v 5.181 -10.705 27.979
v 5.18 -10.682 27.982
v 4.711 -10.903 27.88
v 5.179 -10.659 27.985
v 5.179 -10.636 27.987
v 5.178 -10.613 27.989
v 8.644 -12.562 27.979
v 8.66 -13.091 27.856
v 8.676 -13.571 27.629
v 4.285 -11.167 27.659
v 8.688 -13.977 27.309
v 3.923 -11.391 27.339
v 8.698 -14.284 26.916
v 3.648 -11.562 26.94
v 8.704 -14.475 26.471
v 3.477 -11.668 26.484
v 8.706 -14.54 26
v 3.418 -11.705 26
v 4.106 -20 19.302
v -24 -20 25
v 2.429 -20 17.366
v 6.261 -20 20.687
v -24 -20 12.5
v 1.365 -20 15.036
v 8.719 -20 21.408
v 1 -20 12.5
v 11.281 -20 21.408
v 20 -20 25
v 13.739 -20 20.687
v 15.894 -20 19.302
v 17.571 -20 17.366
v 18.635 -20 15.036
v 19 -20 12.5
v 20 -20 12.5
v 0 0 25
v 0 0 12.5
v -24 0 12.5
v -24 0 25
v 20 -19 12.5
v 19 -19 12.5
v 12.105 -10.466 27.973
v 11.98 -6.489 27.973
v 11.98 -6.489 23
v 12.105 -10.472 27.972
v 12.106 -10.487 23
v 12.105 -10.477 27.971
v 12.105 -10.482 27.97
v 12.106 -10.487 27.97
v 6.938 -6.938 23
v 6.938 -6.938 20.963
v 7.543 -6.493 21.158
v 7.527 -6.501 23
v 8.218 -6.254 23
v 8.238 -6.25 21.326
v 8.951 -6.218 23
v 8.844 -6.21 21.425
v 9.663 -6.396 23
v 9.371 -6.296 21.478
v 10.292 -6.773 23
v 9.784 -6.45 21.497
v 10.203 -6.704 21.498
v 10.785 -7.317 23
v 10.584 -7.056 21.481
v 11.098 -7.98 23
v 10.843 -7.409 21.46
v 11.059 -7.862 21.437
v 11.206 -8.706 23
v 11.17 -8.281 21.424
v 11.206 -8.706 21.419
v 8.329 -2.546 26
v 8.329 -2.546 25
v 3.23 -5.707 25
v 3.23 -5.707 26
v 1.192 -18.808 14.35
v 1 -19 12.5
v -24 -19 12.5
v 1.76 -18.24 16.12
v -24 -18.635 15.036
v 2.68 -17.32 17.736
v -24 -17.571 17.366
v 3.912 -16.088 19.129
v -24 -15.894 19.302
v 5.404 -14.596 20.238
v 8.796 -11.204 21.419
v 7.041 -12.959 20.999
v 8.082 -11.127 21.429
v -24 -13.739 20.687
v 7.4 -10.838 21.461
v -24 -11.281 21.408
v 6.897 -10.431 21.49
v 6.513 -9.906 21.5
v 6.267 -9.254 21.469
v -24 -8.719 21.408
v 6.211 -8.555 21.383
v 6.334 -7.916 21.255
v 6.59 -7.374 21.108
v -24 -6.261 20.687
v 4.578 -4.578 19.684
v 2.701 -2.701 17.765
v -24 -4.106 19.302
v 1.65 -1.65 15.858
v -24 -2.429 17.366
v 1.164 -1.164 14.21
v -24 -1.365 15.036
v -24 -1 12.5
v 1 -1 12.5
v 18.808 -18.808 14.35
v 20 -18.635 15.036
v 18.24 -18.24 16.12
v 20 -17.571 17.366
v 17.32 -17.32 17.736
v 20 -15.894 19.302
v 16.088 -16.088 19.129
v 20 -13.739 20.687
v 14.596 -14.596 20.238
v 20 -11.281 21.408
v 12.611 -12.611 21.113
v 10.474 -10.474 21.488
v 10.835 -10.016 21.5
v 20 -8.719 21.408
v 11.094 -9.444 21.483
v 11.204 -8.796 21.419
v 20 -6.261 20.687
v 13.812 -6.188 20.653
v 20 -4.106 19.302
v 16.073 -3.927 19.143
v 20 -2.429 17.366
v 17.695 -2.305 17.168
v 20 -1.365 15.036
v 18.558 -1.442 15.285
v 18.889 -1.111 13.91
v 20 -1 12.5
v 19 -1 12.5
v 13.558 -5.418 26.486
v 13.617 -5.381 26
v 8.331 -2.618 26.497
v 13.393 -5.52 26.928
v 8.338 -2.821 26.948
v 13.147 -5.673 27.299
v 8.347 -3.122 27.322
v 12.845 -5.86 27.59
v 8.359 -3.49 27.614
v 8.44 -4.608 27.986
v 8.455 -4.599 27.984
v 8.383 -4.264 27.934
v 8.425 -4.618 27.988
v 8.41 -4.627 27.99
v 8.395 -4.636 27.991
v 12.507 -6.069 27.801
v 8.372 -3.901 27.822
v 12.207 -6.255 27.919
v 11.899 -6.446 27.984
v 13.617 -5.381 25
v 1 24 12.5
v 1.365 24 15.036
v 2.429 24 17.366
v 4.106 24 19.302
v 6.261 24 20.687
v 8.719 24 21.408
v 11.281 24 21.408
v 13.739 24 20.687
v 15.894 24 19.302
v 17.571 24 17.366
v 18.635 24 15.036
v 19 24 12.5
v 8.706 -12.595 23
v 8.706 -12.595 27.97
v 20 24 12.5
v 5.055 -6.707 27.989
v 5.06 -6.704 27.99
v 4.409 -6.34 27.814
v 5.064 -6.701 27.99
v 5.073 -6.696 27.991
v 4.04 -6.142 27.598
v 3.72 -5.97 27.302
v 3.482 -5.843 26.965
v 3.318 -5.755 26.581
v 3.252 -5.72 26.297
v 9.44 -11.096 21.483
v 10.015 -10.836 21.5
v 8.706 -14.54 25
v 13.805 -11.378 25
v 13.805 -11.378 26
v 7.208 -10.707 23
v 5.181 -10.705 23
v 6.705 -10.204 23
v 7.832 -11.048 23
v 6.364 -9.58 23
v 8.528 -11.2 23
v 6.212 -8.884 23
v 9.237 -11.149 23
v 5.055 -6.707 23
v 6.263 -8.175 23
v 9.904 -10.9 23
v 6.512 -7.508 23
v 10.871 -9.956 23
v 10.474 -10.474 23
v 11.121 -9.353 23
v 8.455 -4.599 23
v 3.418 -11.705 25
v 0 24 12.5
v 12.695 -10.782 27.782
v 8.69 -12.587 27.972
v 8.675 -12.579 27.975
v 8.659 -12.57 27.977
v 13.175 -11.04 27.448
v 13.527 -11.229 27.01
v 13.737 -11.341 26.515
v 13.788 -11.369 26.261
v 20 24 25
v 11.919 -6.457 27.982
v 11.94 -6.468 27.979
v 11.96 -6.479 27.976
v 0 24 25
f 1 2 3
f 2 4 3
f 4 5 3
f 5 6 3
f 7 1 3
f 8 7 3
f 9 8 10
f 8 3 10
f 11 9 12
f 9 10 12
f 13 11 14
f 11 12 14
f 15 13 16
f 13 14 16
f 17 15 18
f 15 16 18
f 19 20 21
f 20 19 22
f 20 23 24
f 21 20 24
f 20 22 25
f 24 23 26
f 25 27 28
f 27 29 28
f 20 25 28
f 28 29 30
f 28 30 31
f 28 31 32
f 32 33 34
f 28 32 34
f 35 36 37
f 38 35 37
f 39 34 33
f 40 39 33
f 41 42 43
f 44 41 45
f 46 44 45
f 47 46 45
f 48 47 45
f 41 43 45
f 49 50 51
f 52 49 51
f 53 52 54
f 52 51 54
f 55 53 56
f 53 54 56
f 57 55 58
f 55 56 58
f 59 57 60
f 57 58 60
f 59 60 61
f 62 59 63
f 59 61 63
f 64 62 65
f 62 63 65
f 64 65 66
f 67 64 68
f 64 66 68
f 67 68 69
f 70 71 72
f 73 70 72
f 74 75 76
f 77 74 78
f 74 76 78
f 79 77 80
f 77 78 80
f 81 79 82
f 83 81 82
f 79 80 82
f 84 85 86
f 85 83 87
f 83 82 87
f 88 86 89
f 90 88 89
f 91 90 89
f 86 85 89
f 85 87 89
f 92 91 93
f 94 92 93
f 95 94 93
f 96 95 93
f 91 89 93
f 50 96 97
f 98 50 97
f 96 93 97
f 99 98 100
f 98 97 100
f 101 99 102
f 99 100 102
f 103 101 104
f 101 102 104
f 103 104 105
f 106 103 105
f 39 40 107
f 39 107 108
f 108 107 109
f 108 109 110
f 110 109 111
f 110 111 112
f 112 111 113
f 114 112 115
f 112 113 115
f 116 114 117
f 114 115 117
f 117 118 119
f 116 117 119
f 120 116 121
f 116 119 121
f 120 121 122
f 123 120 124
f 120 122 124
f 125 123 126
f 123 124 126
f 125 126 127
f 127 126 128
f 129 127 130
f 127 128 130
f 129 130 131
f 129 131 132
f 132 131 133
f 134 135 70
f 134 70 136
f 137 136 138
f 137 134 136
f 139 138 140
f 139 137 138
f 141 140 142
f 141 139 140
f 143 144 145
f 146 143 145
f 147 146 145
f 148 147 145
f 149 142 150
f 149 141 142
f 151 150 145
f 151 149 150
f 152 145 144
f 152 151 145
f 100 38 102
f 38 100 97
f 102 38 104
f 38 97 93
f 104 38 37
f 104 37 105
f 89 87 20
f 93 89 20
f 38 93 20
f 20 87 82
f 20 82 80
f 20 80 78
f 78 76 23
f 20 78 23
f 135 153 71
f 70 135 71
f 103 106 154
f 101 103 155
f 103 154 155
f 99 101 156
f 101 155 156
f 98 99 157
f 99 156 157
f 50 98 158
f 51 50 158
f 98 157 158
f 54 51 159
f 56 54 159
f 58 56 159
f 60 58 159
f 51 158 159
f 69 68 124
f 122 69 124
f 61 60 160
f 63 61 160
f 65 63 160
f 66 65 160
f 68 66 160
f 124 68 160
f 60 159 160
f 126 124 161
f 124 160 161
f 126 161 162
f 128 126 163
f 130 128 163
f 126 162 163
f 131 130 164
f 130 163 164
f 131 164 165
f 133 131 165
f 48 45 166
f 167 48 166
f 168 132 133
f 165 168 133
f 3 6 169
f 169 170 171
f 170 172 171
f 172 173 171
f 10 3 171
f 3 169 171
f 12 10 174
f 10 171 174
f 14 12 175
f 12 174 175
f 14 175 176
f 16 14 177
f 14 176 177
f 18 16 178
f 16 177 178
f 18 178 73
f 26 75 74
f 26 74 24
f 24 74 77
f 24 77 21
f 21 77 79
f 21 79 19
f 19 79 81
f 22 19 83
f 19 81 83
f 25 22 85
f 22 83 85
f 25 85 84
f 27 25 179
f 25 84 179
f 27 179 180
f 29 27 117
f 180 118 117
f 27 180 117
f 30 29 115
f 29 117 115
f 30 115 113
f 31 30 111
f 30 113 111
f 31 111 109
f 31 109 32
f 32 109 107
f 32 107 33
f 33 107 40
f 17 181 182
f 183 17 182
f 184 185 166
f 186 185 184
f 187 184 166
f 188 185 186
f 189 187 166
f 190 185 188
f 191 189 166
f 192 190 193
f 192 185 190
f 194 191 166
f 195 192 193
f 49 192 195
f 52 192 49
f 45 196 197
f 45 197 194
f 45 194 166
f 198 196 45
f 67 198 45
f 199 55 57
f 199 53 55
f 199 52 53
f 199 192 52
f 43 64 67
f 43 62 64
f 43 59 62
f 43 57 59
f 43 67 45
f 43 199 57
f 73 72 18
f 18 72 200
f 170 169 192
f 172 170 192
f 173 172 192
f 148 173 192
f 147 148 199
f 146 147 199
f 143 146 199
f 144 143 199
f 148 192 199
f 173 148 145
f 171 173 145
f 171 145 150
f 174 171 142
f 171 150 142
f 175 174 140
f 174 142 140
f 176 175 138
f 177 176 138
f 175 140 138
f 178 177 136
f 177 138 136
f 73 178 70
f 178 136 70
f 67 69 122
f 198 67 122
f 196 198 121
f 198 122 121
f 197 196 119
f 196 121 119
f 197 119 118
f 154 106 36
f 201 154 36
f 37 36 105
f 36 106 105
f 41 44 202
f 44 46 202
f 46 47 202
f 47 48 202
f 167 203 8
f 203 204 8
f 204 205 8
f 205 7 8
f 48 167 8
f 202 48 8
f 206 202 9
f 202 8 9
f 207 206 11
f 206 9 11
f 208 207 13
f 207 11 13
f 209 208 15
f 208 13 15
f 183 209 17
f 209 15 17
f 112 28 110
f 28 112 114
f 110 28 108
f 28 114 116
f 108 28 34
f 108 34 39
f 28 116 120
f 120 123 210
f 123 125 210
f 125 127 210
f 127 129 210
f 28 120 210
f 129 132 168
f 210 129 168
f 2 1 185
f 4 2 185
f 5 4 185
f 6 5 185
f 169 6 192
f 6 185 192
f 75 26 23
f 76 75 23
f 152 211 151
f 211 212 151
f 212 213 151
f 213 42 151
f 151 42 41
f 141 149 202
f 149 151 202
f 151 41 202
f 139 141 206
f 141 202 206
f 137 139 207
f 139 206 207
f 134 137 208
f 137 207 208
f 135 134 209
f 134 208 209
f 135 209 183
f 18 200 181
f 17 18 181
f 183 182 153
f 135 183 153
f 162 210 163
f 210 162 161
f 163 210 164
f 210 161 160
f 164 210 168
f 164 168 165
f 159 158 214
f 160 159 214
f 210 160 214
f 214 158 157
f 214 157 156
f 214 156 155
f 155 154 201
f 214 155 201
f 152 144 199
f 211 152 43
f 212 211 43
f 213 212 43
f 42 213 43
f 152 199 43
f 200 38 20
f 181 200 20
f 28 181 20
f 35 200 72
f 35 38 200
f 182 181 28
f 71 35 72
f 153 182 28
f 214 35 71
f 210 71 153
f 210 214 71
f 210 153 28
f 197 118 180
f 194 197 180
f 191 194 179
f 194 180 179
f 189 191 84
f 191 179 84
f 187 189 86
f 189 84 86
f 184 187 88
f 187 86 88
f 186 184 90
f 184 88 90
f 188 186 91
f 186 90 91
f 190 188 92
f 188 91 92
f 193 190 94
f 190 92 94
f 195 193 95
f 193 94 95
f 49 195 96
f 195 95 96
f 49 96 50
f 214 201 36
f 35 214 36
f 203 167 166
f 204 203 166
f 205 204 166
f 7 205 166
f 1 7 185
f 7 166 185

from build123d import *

# Parameters (mm, degrees)
F1_DEPTH      = 25
F2_R          = 9
F3_DEPTH      = 44.001
F4_R          = 9
F5_DEPTH      = 44.001
F7_DEPTH      = 44.0010001
F8_R          = 2.5
F9_DEPTH      = 2
F10_DEPTH     = 3
F11_T1_DEPTH  = 16
F11_T3_DEPTH  = 16
F11_T5_DEPTH  = 16
F11_T7_DEPTH  = 16
F11_T9_DEPTH  = 16
F11_T11_DEPTH = 16


# Not quite as in the source:
# - a fillet or chamfer that OpenCascade refuses, or shapes differently, is made with other operations: its cross-section is extruded or revolved along the edge and cut away or added


with BuildPart() as f1:
    # F0 (on Top) → F1 (new body)
    with BuildSketch(Plane.XY):
        with BuildLine():
            Line((6.9382145885, -6.9382145885), (0, 0))
            Line((0, 0), (-24, 0))
            Line((-24, 0), (-24, -20))
            Line((-24, -20), (20, -20))
            Line((20, -20), (10.4737484944, -10.4737484944))
            ThreePointArc((10.4737484944, -10.4737484944), (6.9382145885, -10.4737484944), (6.9382145885, -6.9382145885))
        make_face()
        with BuildLine():
            Line((20, 24), (0, 24))
            Line((0, 24), (0, 0))
            Line((0, 0), (6.9382145885, -6.9382145885))
            ThreePointArc((6.9382145885, -6.9382145885), (9.6626901223, -6.3962827101), (11.2059815414, -8.7059815414))
            ThreePointArc((11.2059815414, -8.7059815414), (11.0156803727, -9.6626901223), (10.4737484944, -10.4737484944))
            Line((10.4737484944, -10.4737484944), (20, -20))
            Line((20, -20), (20, 24))
        make_face()
    extrude(amount=F1_DEPTH)

    # F2 (on face) → F3 (cut, through all)
    with BuildSketch(Plane(origin=(-24, 0, 0), x_dir=(0, -1, 0), z_dir=(-1, 0, 0))):
        with Locations((10, 12.5)):
            Circle(F2_R)
    extrude(amount=-F3_DEPTH, mode=Mode.SUBTRACT)

    # F4 (on face) → F5 (cut, through all)
    with BuildSketch(Plane(origin=(0, 24, 0), x_dir=(-1, 0, 0), z_dir=(0, 1, 0))):
        with Locations((-10, 12.5)):
            Circle(F4_R)
    extrude(amount=-F5_DEPTH, mode=Mode.SUBTRACT)

    # F6 (on face) → F7 (cut, through all)
    with BuildSketch(Plane.XZ.offset(20)):
        with BuildLine():
            Line((20, 12.5), (19, 12.5))
            ThreePointArc((19, 12.5), (10, 3.5), (1, 12.5))
            Line((1, 12.5), (-24, 12.5))
            Line((-24, 12.5), (-24, 0))
            Line((-24, 0), (20, 0))
            Line((20, 0), (20, 12.5))
        make_face()
    extrude(amount=-F7_DEPTH, mode=Mode.SUBTRACT)

    # F8 (on face) → F9 (cut)
    with BuildSketch(Plane.XY.offset(25)):
        Polygon((5.0551444558, -6.7069682099), (5.1807740761, -10.704994873), (8.7059815414, -12.5952097618), (12.1055593865, -10.4873979877), (11.9799297662, -6.4893713246), (8.4547223009, -4.5991564357), align=None)
        with Locations((8.7059815414, -8.7059815414)):
            Circle(F8_R, mode=Mode.SUBTRACT)
    extrude(amount=-F9_DEPTH, mode=Mode.SUBTRACT)

    # F8 (on face) → F10 (join)
    with BuildSketch(Plane.XY.offset(25)):
        Polygon((3.229725913, -5.7074615441), (3.4181703434, -11.7045015387), (8.7059815414, -14.5398238721), (13.805348309, -11.3781062108), (13.6169038786, -5.3810662162), (8.3290926806, -2.5457438829), align=None)
        Polygon((8.7059815414, -12.5952097618), (5.1807740761, -10.704994873), (5.0551444558, -6.7069682099), (8.4547223009, -4.5991564357), (11.9799297662, -6.4893713246), (12.1055593865, -10.4873979877), align=None, mode=Mode.SUBTRACT)
    extrude(amount=F10_DEPTH)

    # F11: fillet of radius 2 on 6 edges, made by hand

    # F11_s2 → F11_t1 (cut)
    with BuildSketch(Plane(origin=(17.2236751454, -9.2353279974, 0), x_dir=(0, 0, 1), z_dir=(-0.8813018663, 0.4725537222, 0))):
        with BuildLine():
            ThreePointArc((26, 1.6923749137), (27.4142135624, 1.1065884761), (28, -0.3076250863))
            Line((28, -0.3076250863), (28, 1.6923749137))
            Line((28, 1.6923749137), (26, 1.6923749137))
        make_face()
    extrude(amount=F11_T1_DEPTH, mode=Mode.SUBTRACT)

    # F11_s4 → F11_t3 (cut)
    with BuildSketch(Plane(origin=(0.5278354617, -16.7977921518, 0), x_dir=(0, 0, 1), z_dir=(-0.0314074051, 0.9995066658, 0))):
        with BuildLine():
            ThreePointArc((28, 11.4411808674), (27.4142135624, 12.8553944297), (26, 13.4411808674))
            Line((26, 13.4411808674), (28, 13.4411808674))
            Line((28, 13.4411808674), (28, 11.4411808674))
        make_face()
    extrude(amount=F11_T3_DEPTH, mode=Mode.SUBTRACT)

    # F11_s6 → F11_t5 (cut)
    with BuildSketch(Plane(origin=(-4.4726864595, -2.7731623193, 0), x_dir=(0, 0, 1), z_dir=(0.8498944613, 0.5269529435, 0))):
        with BuildLine():
            ThreePointArc((28, 14.9449583763), (27.4142135624, 16.3591719387), (26, 16.9449583763))
            Line((26, 16.9449583763), (28, 16.9449583763))
            Line((28, 16.9449583763), (28, 14.9449583763))
        make_face()
    extrude(amount=F11_T5_DEPTH, mode=Mode.SUBTRACT)

    # F11_s8 → F11_t7 (cut)
    with BuildSketch(Plane(origin=(3.122845284, -1.6744684418, 0), x_dir=(0, 0, 1), z_dir=(0.8813018663, -0.4725537222, 0))):
        with BuildLine():
            ThreePointArc((28, 6.6999299317), (27.4142135624, 8.1141434941), (26, 8.6999299317))
            Line((26, 8.6999299317), (28, 8.6999299317))
            Line((28, 8.6999299317), (28, 6.6999299317))
        make_face()
    extrude(amount=F11_T7_DEPTH, mode=Mode.SUBTRACT)

    # F11_s10 → F11_t9 (cut)
    with BuildSketch(Plane(origin=(0.0253169806, -0.8056854995, 0), x_dir=(0, 0, 1), z_dir=(0.0314074051, -0.9995066658, 0))):
        with BuildLine():
            ThreePointArc((28, -5.048876022), (27.4142135624, -3.6346624596), (26, -3.048876022))
            Line((26, -3.048876022), (28, -3.048876022))
            Line((28, -3.048876022), (28, -5.048876022))
        make_face()
    extrude(amount=F11_T9_DEPTH, mode=Mode.SUBTRACT)

    # F11_s12 → F11_t11 (cut)
    with BuildSketch(Plane(origin=(9.1256249208, 5.6580847774, 0), x_dir=(0, 0, 1), z_dir=(-0.8498944613, -0.5269529435, 0))):
        with BuildLine():
            ThreePointArc((28, -8.5526535309), (27.4142135624, -7.1384399686), (26, -6.5526535309))
            Line((26, -6.5526535309), (28, -6.5526535309))
            Line((28, -6.5526535309), (28, -8.5526535309))
        make_face()
    extrude(amount=F11_T11_DEPTH, mode=Mode.SUBTRACT)


solid = f1.part
